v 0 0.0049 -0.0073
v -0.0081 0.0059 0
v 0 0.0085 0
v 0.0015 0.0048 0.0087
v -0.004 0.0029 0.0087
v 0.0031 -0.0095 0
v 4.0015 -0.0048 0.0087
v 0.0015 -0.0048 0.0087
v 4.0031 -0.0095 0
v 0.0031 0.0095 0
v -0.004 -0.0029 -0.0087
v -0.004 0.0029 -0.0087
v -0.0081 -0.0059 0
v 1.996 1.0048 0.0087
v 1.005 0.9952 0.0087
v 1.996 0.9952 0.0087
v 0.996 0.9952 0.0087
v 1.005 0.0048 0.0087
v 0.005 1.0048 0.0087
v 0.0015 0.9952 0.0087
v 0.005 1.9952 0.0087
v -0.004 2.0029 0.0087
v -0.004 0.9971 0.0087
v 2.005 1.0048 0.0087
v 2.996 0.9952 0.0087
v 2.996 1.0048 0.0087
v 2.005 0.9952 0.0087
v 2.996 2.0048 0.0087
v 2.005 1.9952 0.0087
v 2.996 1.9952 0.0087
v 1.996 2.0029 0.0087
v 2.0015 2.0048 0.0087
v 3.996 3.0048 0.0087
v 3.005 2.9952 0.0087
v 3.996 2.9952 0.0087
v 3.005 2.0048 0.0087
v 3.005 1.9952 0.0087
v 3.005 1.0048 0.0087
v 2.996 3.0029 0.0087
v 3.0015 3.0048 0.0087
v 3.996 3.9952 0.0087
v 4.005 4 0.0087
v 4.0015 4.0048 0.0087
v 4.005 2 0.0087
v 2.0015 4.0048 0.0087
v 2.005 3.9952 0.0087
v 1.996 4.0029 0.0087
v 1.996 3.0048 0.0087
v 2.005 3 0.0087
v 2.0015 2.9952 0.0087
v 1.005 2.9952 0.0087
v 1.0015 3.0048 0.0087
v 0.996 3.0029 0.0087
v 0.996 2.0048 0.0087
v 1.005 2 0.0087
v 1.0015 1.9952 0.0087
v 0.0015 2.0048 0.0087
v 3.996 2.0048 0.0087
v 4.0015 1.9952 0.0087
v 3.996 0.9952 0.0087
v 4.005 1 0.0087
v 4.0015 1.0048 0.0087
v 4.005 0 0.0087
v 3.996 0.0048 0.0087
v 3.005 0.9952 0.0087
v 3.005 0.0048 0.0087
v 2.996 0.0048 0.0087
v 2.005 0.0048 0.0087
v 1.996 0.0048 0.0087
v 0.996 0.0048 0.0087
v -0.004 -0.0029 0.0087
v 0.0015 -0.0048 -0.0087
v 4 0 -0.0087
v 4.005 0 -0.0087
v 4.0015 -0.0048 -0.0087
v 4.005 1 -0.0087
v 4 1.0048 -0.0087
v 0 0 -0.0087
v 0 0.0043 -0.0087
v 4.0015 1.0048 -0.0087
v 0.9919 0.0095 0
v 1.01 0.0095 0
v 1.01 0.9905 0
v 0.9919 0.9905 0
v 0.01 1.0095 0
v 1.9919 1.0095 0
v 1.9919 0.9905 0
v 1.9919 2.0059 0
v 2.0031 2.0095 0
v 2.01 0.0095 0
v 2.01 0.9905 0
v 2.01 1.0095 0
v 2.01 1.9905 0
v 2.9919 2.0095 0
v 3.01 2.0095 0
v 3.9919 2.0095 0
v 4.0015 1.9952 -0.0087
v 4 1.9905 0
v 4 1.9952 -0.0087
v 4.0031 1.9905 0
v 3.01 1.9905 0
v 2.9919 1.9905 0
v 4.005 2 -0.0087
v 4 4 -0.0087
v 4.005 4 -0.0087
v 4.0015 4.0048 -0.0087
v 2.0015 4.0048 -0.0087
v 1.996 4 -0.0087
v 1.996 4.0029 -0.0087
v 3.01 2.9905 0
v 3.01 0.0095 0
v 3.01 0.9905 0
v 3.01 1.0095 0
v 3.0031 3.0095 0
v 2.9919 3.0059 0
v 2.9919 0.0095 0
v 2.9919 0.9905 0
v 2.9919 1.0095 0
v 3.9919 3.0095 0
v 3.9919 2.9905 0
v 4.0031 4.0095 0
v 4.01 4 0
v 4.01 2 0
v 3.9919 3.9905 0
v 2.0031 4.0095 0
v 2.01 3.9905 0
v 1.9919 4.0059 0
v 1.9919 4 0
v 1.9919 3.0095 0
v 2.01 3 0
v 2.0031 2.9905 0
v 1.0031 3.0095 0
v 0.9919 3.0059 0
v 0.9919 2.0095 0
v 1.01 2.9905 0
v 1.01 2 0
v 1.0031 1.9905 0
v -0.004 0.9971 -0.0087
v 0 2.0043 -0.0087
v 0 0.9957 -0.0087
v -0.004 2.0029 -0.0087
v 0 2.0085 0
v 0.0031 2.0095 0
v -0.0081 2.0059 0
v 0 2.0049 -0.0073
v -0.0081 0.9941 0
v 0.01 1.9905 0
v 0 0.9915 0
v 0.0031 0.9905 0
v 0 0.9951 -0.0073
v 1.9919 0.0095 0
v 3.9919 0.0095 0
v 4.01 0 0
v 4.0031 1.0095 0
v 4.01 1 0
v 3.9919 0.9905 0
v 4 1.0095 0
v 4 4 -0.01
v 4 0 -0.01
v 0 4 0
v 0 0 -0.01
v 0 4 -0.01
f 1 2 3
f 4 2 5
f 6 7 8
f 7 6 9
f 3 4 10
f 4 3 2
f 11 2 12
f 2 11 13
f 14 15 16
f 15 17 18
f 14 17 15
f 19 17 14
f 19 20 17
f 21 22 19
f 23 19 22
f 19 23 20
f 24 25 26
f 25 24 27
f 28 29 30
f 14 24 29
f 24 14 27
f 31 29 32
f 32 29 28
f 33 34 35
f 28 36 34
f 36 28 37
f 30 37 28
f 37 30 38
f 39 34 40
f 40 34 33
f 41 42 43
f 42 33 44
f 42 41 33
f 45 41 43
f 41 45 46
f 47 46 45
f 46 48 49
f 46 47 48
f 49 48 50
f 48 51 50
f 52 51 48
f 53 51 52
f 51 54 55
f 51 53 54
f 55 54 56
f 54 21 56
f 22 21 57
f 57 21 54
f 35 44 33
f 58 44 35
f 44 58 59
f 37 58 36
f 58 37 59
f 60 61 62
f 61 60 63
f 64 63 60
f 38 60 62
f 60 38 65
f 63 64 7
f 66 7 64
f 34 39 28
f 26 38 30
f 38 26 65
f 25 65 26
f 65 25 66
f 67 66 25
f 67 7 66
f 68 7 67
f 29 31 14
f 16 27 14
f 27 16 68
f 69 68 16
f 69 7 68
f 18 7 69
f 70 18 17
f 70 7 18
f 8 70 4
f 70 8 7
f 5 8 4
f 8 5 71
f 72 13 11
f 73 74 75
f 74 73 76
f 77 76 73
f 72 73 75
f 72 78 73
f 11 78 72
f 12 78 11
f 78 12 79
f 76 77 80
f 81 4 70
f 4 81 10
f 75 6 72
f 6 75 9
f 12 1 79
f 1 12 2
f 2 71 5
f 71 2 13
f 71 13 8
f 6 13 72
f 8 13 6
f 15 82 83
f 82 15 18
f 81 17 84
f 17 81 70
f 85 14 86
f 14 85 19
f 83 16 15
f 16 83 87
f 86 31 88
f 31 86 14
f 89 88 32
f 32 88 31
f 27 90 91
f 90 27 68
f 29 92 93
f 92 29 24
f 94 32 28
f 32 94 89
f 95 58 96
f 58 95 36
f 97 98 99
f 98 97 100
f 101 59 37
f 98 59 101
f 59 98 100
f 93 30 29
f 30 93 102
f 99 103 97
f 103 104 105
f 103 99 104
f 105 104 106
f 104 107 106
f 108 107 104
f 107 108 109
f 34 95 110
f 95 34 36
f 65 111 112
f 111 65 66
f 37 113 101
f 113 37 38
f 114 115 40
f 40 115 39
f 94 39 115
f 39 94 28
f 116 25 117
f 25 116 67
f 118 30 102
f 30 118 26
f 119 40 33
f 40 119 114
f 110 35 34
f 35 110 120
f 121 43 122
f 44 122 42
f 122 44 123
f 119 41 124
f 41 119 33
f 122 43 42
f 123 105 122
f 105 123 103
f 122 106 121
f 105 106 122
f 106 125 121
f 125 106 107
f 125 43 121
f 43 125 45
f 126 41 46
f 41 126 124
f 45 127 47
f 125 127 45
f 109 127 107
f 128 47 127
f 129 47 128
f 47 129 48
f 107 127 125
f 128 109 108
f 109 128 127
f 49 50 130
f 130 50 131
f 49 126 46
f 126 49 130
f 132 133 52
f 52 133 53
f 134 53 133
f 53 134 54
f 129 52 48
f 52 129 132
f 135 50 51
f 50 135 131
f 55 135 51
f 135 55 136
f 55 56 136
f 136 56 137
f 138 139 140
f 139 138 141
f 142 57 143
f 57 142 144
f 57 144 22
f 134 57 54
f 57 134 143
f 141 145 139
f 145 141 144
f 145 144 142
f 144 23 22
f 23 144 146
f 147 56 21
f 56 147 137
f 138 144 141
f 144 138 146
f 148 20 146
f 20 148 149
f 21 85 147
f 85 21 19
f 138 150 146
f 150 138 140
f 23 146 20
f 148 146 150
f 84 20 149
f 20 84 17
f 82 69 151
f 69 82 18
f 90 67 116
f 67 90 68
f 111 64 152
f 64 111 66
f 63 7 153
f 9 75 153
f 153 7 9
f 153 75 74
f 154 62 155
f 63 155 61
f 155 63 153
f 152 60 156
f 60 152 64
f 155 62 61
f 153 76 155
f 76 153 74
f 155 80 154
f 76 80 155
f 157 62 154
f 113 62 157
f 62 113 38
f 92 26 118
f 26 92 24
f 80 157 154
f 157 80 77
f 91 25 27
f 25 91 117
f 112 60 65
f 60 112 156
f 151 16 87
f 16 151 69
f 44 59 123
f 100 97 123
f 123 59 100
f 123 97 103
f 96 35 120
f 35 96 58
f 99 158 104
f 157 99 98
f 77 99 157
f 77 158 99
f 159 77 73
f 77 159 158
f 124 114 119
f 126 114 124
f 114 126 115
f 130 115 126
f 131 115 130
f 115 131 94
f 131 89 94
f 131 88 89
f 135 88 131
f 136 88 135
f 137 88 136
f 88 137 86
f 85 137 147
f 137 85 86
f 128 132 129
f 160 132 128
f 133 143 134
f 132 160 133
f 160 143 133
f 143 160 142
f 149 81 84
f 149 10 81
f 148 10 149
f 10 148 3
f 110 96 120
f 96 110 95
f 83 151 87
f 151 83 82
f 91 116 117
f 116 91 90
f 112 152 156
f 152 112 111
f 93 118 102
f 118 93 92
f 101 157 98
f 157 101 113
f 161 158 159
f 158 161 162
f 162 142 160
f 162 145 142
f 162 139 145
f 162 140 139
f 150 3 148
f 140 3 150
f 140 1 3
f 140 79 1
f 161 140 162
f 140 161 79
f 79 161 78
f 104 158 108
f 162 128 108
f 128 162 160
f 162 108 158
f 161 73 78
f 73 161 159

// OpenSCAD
hull(){
    translate([0, 0]) sphere(0.01);
    translate([1, 0]) sphere(0.01);
}
hull(){
    translate([1, 0]) sphere(0.01);
    translate([1, 1]) sphere(0.01);
}
hull(){
    translate([1, 1]) sphere(0.01);
    translate([2, 1]) sphere(0.01);
}
hull(){
    translate([2, 1]) sphere(0.01);
    translate([2, 2]) sphere(0.01);
}
hull(){
    translate([2, 2]) sphere(0.01);
    translate([3, 2]) sphere(0.01);
}
hull(){
    translate([3, 2]) sphere(0.01);
    translate([3, 3]) sphere(0.01);
}
hull(){
    translate([3, 3]) sphere(0.01);
    translate([4, 3]) sphere(0.01);
}
hull(){
    translate([4, 3]) sphere(0.01);
    translate([4, 4]) sphere(0.01);
}
hull(){
    translate([4, 4]) sphere(0.01);
    translate([3, 4]) sphere(0.01);
}
hull(){
    translate([3, 4]) sphere(0.01);
    translate([2, 4]) sphere(0.01);
}
hull(){
    translate([2, 4]) sphere(0.01);
    translate([2, 3]) sphere(0.01);
}
hull(){
    translate([2, 3]) sphere(0.01);
    translate([1, 3]) sphere(0.01);
}
hull(){
    translate([1, 3]) sphere(0.01);
    translate([1, 2]) sphere(0.01);
}
hull(){
    translate([1, 2]) sphere(0.01);
    translate([0, 2]) sphere(0.01);
}
hull(){
    translate([0, 2]) sphere(0.01);
    translate([0, 1]) sphere(0.01);
}
hull(){
    translate([0, 1]) sphere(0.01);
    translate([1, 1]) sphere(0.01);
}
hull(){
    translate([1, 1]) sphere(0.01);
    translate([1, 0]) sphere(0.01);
}
hull(){
    translate([1, 0]) sphere(0.01);
    translate([2, 0]) sphere(0.01);
}
hull(){
    translate([2, 0]) sphere(0.01);
    translate([3, 0]) sphere(0.01);
}
hull(){
    translate([3, 0]) sphere(0.01);
    translate([4, 0]) sphere(0.01);
}
hull(){
    translate([4, 0]) sphere(0.01);
    translate([4, 1]) sphere(0.01);
}
hull(){
    translate([4, 1]) sphere(0.01);
    translate([3, 1]) sphere(0.01);
}
hull(){
    translate([3, 1]) sphere(0.01);
    translate([3, 0]) sphere(0.01);
}
hull(){
    translate([3, 0]) sphere(0.01);
    translate([2, 0]) sphere(0.01);
}
hull(){
    translate([2, 0]) sphere(0.01);
    translate([2, 1]) sphere(0.01);
}
hull(){
    translate([2, 1]) sphere(0.01);
    translate([3, 1]) sphere(0.01);
}
hull(){
    translate([3, 1]) sphere(0.01);
    translate([3, 2]) sphere(0.01);
}
hull(){
    translate([3, 2]) sphere(0.01);
    translate([4, 2]) sphere(0.01);
}
hull(){
    translate([4, 2]) sphere(0.01);
    translate([4, 3]) sphere(0.01);
}
translate([0,0,-0.01]) color([0.1,0.1,0.1]) cube([4,4,0.01]);
